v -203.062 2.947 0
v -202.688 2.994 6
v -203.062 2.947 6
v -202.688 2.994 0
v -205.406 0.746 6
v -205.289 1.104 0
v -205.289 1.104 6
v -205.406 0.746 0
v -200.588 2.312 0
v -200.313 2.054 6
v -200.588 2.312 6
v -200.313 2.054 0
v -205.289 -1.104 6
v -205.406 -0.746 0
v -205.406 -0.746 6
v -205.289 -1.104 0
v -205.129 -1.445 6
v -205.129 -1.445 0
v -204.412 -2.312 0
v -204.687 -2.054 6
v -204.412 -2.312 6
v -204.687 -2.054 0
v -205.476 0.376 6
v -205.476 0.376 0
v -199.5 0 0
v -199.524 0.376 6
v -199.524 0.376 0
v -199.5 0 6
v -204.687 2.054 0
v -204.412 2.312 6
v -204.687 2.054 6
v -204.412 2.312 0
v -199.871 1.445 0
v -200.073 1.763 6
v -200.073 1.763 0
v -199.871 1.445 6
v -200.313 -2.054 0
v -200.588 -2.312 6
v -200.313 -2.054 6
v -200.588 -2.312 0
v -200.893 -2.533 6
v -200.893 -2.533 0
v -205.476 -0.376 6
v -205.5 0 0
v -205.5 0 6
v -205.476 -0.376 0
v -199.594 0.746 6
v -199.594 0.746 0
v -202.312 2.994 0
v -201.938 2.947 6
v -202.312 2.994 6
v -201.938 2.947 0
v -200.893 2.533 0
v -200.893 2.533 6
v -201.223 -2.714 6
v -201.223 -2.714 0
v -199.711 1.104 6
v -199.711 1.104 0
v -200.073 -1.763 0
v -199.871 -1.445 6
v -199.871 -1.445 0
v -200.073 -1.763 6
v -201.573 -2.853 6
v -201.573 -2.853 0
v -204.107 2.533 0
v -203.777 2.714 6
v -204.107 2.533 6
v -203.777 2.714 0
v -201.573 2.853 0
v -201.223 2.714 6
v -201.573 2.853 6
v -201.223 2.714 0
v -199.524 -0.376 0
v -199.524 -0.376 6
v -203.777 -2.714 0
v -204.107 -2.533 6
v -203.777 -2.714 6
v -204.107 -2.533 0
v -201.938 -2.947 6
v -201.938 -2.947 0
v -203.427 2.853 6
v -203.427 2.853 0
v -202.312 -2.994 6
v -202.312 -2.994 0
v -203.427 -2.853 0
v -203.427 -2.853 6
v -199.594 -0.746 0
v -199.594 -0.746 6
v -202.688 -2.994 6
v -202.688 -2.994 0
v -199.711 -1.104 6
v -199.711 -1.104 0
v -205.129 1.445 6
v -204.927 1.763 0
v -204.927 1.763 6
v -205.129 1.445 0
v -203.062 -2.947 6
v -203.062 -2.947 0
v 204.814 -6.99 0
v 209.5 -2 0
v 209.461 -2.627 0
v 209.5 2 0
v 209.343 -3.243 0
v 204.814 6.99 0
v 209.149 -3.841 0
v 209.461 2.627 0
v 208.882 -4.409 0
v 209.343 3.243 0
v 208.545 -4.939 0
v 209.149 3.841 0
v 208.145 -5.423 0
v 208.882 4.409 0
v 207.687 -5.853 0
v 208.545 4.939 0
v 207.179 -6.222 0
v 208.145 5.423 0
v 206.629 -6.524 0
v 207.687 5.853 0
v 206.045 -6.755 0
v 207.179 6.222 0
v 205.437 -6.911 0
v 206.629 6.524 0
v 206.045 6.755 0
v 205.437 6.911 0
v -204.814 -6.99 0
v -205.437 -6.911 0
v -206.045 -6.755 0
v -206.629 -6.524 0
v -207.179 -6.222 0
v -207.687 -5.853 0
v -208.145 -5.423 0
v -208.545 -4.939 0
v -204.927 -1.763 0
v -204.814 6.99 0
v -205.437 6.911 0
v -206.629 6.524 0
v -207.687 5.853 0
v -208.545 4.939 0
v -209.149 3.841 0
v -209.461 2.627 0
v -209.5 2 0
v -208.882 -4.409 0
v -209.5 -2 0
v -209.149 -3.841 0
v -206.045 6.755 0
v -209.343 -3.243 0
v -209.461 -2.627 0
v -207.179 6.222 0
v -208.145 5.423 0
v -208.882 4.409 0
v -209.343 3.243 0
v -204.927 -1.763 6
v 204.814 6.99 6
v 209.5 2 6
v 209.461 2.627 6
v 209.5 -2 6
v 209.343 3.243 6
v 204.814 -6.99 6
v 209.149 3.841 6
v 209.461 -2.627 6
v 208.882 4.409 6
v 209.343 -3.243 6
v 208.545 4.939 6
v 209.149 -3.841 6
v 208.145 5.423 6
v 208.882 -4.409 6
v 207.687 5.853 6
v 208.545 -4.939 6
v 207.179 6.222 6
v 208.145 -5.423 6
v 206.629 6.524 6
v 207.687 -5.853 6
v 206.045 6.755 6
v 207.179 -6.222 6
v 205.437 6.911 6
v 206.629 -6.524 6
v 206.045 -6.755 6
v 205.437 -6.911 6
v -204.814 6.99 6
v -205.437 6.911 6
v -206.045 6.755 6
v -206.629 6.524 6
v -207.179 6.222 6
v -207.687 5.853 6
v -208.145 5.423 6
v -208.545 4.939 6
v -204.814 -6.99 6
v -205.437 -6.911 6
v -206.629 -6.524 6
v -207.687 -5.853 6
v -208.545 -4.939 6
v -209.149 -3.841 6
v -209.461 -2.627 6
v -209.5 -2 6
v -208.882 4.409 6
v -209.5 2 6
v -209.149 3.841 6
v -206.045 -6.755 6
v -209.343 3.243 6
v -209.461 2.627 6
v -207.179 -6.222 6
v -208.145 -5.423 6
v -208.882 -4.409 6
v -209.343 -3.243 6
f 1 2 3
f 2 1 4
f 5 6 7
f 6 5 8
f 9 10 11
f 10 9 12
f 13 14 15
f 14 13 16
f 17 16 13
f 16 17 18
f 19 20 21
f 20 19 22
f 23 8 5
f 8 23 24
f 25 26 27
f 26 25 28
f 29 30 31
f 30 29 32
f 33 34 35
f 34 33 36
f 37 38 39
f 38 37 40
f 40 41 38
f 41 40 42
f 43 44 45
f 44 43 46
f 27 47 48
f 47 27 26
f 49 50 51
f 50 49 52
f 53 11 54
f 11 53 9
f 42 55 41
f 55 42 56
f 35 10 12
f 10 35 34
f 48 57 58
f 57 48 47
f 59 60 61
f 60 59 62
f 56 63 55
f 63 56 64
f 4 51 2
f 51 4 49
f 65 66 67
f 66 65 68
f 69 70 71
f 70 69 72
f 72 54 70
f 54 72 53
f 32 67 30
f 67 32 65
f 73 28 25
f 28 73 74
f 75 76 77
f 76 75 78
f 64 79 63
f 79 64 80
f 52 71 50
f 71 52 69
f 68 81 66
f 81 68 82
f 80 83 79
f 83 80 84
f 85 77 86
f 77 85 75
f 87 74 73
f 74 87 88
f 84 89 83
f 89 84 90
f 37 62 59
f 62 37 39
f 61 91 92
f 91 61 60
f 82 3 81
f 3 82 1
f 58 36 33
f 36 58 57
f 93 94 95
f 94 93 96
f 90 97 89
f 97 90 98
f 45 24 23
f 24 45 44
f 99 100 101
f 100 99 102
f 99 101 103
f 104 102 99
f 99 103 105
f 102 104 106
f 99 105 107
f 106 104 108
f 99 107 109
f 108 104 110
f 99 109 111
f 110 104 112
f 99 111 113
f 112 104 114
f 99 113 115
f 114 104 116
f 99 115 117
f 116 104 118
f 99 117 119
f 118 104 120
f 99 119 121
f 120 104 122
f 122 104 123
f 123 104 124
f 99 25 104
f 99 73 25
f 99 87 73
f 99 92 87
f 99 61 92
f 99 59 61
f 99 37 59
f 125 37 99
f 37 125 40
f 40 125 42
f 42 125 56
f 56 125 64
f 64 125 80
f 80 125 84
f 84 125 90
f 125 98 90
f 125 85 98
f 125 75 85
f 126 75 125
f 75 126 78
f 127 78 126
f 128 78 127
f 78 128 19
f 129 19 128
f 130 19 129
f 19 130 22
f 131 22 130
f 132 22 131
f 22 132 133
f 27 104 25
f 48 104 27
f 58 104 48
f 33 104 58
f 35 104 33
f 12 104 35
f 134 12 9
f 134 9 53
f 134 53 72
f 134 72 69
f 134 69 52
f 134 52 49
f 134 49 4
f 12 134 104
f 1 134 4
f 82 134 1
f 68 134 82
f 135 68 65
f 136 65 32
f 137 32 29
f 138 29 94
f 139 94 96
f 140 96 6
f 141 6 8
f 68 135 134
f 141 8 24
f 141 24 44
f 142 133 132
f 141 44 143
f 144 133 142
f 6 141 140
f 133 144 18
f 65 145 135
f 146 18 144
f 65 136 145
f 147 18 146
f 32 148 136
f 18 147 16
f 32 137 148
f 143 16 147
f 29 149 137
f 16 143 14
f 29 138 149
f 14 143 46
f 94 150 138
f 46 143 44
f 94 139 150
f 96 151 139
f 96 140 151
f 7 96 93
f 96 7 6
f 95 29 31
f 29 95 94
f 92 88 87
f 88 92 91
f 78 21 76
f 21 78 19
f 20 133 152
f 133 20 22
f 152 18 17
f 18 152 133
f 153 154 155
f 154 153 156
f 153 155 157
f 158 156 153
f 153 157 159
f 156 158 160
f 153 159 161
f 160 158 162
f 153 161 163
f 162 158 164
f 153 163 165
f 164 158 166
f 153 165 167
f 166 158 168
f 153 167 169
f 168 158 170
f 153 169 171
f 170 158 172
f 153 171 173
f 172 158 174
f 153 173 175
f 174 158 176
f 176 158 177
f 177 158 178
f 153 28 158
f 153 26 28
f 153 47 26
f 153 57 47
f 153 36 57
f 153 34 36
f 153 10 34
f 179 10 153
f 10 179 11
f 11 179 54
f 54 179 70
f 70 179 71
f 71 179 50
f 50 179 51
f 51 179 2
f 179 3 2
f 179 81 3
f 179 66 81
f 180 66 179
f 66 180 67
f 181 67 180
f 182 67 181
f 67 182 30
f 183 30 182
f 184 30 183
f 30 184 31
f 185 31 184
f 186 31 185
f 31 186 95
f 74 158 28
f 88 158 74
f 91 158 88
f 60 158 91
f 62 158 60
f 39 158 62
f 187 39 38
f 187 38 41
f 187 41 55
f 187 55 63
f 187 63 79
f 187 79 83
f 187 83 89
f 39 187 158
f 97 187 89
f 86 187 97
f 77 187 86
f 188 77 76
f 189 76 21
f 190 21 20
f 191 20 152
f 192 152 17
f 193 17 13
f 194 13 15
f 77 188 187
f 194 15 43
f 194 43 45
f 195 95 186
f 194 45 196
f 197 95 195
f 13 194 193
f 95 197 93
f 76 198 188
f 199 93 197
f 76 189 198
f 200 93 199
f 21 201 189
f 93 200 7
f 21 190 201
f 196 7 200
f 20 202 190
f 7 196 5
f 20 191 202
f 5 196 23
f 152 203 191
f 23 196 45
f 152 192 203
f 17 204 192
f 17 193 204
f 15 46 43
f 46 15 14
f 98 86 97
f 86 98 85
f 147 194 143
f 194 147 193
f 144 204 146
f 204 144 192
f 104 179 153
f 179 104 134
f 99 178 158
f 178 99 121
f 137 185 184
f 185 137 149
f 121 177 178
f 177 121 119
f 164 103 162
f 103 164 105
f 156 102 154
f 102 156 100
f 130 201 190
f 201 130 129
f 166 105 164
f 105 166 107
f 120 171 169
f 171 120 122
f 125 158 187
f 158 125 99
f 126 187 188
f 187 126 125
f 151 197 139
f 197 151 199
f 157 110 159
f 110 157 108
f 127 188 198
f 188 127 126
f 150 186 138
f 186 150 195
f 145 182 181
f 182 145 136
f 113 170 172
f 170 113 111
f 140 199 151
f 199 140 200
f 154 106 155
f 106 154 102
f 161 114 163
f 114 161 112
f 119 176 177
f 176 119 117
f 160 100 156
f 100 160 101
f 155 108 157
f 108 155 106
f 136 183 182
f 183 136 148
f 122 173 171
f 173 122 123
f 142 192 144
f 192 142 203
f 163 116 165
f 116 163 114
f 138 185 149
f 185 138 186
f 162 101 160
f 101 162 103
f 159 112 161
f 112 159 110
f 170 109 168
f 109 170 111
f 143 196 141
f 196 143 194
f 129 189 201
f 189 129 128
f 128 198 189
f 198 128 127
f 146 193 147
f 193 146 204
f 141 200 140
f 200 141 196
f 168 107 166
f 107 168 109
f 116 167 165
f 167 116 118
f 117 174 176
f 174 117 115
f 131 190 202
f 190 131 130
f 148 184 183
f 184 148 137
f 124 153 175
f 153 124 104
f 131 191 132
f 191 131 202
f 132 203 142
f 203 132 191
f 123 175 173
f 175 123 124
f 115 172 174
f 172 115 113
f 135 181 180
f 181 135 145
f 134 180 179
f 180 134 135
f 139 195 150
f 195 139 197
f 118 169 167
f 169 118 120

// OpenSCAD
$fn = 50;


difference() {
	union() {
		hull() {
			translate(v = [-204.5000000000, 2.0000000000, 0]) {
				cylinder(h = 6, r = 5);
			}
			translate(v = [204.5000000000, 2.0000000000, 0]) {
				cylinder(h = 6, r = 5);
			}
			translate(v = [-204.5000000000, -2.0000000000, 0]) {
				cylinder(h = 6, r = 5);
			}
			translate(v = [204.5000000000, -2.0000000000, 0]) {
				cylinder(h = 6, r = 5);
			}
		}
	}
	union() {
		translate(v = [-202.5000000000, 0.0000000000, 0]) {
			cylinder(h = 6, r = 3.0000000000);
		}
		translate(v = [-202.5000000000, 0.0000000000, 0]) {
			cylinder(h = 6, r = 1.5000000000);
		}
		translate(v = [-202.5000000000, 0.0000000000, 0]) {
			cylinder(h = 6, r = 1.5000000000);
		}
		translate(v = [-202.5000000000, 0.0000000000, 0]) {
			cylinder(h = 6, r = 1.5000000000);
		}
	}
}
